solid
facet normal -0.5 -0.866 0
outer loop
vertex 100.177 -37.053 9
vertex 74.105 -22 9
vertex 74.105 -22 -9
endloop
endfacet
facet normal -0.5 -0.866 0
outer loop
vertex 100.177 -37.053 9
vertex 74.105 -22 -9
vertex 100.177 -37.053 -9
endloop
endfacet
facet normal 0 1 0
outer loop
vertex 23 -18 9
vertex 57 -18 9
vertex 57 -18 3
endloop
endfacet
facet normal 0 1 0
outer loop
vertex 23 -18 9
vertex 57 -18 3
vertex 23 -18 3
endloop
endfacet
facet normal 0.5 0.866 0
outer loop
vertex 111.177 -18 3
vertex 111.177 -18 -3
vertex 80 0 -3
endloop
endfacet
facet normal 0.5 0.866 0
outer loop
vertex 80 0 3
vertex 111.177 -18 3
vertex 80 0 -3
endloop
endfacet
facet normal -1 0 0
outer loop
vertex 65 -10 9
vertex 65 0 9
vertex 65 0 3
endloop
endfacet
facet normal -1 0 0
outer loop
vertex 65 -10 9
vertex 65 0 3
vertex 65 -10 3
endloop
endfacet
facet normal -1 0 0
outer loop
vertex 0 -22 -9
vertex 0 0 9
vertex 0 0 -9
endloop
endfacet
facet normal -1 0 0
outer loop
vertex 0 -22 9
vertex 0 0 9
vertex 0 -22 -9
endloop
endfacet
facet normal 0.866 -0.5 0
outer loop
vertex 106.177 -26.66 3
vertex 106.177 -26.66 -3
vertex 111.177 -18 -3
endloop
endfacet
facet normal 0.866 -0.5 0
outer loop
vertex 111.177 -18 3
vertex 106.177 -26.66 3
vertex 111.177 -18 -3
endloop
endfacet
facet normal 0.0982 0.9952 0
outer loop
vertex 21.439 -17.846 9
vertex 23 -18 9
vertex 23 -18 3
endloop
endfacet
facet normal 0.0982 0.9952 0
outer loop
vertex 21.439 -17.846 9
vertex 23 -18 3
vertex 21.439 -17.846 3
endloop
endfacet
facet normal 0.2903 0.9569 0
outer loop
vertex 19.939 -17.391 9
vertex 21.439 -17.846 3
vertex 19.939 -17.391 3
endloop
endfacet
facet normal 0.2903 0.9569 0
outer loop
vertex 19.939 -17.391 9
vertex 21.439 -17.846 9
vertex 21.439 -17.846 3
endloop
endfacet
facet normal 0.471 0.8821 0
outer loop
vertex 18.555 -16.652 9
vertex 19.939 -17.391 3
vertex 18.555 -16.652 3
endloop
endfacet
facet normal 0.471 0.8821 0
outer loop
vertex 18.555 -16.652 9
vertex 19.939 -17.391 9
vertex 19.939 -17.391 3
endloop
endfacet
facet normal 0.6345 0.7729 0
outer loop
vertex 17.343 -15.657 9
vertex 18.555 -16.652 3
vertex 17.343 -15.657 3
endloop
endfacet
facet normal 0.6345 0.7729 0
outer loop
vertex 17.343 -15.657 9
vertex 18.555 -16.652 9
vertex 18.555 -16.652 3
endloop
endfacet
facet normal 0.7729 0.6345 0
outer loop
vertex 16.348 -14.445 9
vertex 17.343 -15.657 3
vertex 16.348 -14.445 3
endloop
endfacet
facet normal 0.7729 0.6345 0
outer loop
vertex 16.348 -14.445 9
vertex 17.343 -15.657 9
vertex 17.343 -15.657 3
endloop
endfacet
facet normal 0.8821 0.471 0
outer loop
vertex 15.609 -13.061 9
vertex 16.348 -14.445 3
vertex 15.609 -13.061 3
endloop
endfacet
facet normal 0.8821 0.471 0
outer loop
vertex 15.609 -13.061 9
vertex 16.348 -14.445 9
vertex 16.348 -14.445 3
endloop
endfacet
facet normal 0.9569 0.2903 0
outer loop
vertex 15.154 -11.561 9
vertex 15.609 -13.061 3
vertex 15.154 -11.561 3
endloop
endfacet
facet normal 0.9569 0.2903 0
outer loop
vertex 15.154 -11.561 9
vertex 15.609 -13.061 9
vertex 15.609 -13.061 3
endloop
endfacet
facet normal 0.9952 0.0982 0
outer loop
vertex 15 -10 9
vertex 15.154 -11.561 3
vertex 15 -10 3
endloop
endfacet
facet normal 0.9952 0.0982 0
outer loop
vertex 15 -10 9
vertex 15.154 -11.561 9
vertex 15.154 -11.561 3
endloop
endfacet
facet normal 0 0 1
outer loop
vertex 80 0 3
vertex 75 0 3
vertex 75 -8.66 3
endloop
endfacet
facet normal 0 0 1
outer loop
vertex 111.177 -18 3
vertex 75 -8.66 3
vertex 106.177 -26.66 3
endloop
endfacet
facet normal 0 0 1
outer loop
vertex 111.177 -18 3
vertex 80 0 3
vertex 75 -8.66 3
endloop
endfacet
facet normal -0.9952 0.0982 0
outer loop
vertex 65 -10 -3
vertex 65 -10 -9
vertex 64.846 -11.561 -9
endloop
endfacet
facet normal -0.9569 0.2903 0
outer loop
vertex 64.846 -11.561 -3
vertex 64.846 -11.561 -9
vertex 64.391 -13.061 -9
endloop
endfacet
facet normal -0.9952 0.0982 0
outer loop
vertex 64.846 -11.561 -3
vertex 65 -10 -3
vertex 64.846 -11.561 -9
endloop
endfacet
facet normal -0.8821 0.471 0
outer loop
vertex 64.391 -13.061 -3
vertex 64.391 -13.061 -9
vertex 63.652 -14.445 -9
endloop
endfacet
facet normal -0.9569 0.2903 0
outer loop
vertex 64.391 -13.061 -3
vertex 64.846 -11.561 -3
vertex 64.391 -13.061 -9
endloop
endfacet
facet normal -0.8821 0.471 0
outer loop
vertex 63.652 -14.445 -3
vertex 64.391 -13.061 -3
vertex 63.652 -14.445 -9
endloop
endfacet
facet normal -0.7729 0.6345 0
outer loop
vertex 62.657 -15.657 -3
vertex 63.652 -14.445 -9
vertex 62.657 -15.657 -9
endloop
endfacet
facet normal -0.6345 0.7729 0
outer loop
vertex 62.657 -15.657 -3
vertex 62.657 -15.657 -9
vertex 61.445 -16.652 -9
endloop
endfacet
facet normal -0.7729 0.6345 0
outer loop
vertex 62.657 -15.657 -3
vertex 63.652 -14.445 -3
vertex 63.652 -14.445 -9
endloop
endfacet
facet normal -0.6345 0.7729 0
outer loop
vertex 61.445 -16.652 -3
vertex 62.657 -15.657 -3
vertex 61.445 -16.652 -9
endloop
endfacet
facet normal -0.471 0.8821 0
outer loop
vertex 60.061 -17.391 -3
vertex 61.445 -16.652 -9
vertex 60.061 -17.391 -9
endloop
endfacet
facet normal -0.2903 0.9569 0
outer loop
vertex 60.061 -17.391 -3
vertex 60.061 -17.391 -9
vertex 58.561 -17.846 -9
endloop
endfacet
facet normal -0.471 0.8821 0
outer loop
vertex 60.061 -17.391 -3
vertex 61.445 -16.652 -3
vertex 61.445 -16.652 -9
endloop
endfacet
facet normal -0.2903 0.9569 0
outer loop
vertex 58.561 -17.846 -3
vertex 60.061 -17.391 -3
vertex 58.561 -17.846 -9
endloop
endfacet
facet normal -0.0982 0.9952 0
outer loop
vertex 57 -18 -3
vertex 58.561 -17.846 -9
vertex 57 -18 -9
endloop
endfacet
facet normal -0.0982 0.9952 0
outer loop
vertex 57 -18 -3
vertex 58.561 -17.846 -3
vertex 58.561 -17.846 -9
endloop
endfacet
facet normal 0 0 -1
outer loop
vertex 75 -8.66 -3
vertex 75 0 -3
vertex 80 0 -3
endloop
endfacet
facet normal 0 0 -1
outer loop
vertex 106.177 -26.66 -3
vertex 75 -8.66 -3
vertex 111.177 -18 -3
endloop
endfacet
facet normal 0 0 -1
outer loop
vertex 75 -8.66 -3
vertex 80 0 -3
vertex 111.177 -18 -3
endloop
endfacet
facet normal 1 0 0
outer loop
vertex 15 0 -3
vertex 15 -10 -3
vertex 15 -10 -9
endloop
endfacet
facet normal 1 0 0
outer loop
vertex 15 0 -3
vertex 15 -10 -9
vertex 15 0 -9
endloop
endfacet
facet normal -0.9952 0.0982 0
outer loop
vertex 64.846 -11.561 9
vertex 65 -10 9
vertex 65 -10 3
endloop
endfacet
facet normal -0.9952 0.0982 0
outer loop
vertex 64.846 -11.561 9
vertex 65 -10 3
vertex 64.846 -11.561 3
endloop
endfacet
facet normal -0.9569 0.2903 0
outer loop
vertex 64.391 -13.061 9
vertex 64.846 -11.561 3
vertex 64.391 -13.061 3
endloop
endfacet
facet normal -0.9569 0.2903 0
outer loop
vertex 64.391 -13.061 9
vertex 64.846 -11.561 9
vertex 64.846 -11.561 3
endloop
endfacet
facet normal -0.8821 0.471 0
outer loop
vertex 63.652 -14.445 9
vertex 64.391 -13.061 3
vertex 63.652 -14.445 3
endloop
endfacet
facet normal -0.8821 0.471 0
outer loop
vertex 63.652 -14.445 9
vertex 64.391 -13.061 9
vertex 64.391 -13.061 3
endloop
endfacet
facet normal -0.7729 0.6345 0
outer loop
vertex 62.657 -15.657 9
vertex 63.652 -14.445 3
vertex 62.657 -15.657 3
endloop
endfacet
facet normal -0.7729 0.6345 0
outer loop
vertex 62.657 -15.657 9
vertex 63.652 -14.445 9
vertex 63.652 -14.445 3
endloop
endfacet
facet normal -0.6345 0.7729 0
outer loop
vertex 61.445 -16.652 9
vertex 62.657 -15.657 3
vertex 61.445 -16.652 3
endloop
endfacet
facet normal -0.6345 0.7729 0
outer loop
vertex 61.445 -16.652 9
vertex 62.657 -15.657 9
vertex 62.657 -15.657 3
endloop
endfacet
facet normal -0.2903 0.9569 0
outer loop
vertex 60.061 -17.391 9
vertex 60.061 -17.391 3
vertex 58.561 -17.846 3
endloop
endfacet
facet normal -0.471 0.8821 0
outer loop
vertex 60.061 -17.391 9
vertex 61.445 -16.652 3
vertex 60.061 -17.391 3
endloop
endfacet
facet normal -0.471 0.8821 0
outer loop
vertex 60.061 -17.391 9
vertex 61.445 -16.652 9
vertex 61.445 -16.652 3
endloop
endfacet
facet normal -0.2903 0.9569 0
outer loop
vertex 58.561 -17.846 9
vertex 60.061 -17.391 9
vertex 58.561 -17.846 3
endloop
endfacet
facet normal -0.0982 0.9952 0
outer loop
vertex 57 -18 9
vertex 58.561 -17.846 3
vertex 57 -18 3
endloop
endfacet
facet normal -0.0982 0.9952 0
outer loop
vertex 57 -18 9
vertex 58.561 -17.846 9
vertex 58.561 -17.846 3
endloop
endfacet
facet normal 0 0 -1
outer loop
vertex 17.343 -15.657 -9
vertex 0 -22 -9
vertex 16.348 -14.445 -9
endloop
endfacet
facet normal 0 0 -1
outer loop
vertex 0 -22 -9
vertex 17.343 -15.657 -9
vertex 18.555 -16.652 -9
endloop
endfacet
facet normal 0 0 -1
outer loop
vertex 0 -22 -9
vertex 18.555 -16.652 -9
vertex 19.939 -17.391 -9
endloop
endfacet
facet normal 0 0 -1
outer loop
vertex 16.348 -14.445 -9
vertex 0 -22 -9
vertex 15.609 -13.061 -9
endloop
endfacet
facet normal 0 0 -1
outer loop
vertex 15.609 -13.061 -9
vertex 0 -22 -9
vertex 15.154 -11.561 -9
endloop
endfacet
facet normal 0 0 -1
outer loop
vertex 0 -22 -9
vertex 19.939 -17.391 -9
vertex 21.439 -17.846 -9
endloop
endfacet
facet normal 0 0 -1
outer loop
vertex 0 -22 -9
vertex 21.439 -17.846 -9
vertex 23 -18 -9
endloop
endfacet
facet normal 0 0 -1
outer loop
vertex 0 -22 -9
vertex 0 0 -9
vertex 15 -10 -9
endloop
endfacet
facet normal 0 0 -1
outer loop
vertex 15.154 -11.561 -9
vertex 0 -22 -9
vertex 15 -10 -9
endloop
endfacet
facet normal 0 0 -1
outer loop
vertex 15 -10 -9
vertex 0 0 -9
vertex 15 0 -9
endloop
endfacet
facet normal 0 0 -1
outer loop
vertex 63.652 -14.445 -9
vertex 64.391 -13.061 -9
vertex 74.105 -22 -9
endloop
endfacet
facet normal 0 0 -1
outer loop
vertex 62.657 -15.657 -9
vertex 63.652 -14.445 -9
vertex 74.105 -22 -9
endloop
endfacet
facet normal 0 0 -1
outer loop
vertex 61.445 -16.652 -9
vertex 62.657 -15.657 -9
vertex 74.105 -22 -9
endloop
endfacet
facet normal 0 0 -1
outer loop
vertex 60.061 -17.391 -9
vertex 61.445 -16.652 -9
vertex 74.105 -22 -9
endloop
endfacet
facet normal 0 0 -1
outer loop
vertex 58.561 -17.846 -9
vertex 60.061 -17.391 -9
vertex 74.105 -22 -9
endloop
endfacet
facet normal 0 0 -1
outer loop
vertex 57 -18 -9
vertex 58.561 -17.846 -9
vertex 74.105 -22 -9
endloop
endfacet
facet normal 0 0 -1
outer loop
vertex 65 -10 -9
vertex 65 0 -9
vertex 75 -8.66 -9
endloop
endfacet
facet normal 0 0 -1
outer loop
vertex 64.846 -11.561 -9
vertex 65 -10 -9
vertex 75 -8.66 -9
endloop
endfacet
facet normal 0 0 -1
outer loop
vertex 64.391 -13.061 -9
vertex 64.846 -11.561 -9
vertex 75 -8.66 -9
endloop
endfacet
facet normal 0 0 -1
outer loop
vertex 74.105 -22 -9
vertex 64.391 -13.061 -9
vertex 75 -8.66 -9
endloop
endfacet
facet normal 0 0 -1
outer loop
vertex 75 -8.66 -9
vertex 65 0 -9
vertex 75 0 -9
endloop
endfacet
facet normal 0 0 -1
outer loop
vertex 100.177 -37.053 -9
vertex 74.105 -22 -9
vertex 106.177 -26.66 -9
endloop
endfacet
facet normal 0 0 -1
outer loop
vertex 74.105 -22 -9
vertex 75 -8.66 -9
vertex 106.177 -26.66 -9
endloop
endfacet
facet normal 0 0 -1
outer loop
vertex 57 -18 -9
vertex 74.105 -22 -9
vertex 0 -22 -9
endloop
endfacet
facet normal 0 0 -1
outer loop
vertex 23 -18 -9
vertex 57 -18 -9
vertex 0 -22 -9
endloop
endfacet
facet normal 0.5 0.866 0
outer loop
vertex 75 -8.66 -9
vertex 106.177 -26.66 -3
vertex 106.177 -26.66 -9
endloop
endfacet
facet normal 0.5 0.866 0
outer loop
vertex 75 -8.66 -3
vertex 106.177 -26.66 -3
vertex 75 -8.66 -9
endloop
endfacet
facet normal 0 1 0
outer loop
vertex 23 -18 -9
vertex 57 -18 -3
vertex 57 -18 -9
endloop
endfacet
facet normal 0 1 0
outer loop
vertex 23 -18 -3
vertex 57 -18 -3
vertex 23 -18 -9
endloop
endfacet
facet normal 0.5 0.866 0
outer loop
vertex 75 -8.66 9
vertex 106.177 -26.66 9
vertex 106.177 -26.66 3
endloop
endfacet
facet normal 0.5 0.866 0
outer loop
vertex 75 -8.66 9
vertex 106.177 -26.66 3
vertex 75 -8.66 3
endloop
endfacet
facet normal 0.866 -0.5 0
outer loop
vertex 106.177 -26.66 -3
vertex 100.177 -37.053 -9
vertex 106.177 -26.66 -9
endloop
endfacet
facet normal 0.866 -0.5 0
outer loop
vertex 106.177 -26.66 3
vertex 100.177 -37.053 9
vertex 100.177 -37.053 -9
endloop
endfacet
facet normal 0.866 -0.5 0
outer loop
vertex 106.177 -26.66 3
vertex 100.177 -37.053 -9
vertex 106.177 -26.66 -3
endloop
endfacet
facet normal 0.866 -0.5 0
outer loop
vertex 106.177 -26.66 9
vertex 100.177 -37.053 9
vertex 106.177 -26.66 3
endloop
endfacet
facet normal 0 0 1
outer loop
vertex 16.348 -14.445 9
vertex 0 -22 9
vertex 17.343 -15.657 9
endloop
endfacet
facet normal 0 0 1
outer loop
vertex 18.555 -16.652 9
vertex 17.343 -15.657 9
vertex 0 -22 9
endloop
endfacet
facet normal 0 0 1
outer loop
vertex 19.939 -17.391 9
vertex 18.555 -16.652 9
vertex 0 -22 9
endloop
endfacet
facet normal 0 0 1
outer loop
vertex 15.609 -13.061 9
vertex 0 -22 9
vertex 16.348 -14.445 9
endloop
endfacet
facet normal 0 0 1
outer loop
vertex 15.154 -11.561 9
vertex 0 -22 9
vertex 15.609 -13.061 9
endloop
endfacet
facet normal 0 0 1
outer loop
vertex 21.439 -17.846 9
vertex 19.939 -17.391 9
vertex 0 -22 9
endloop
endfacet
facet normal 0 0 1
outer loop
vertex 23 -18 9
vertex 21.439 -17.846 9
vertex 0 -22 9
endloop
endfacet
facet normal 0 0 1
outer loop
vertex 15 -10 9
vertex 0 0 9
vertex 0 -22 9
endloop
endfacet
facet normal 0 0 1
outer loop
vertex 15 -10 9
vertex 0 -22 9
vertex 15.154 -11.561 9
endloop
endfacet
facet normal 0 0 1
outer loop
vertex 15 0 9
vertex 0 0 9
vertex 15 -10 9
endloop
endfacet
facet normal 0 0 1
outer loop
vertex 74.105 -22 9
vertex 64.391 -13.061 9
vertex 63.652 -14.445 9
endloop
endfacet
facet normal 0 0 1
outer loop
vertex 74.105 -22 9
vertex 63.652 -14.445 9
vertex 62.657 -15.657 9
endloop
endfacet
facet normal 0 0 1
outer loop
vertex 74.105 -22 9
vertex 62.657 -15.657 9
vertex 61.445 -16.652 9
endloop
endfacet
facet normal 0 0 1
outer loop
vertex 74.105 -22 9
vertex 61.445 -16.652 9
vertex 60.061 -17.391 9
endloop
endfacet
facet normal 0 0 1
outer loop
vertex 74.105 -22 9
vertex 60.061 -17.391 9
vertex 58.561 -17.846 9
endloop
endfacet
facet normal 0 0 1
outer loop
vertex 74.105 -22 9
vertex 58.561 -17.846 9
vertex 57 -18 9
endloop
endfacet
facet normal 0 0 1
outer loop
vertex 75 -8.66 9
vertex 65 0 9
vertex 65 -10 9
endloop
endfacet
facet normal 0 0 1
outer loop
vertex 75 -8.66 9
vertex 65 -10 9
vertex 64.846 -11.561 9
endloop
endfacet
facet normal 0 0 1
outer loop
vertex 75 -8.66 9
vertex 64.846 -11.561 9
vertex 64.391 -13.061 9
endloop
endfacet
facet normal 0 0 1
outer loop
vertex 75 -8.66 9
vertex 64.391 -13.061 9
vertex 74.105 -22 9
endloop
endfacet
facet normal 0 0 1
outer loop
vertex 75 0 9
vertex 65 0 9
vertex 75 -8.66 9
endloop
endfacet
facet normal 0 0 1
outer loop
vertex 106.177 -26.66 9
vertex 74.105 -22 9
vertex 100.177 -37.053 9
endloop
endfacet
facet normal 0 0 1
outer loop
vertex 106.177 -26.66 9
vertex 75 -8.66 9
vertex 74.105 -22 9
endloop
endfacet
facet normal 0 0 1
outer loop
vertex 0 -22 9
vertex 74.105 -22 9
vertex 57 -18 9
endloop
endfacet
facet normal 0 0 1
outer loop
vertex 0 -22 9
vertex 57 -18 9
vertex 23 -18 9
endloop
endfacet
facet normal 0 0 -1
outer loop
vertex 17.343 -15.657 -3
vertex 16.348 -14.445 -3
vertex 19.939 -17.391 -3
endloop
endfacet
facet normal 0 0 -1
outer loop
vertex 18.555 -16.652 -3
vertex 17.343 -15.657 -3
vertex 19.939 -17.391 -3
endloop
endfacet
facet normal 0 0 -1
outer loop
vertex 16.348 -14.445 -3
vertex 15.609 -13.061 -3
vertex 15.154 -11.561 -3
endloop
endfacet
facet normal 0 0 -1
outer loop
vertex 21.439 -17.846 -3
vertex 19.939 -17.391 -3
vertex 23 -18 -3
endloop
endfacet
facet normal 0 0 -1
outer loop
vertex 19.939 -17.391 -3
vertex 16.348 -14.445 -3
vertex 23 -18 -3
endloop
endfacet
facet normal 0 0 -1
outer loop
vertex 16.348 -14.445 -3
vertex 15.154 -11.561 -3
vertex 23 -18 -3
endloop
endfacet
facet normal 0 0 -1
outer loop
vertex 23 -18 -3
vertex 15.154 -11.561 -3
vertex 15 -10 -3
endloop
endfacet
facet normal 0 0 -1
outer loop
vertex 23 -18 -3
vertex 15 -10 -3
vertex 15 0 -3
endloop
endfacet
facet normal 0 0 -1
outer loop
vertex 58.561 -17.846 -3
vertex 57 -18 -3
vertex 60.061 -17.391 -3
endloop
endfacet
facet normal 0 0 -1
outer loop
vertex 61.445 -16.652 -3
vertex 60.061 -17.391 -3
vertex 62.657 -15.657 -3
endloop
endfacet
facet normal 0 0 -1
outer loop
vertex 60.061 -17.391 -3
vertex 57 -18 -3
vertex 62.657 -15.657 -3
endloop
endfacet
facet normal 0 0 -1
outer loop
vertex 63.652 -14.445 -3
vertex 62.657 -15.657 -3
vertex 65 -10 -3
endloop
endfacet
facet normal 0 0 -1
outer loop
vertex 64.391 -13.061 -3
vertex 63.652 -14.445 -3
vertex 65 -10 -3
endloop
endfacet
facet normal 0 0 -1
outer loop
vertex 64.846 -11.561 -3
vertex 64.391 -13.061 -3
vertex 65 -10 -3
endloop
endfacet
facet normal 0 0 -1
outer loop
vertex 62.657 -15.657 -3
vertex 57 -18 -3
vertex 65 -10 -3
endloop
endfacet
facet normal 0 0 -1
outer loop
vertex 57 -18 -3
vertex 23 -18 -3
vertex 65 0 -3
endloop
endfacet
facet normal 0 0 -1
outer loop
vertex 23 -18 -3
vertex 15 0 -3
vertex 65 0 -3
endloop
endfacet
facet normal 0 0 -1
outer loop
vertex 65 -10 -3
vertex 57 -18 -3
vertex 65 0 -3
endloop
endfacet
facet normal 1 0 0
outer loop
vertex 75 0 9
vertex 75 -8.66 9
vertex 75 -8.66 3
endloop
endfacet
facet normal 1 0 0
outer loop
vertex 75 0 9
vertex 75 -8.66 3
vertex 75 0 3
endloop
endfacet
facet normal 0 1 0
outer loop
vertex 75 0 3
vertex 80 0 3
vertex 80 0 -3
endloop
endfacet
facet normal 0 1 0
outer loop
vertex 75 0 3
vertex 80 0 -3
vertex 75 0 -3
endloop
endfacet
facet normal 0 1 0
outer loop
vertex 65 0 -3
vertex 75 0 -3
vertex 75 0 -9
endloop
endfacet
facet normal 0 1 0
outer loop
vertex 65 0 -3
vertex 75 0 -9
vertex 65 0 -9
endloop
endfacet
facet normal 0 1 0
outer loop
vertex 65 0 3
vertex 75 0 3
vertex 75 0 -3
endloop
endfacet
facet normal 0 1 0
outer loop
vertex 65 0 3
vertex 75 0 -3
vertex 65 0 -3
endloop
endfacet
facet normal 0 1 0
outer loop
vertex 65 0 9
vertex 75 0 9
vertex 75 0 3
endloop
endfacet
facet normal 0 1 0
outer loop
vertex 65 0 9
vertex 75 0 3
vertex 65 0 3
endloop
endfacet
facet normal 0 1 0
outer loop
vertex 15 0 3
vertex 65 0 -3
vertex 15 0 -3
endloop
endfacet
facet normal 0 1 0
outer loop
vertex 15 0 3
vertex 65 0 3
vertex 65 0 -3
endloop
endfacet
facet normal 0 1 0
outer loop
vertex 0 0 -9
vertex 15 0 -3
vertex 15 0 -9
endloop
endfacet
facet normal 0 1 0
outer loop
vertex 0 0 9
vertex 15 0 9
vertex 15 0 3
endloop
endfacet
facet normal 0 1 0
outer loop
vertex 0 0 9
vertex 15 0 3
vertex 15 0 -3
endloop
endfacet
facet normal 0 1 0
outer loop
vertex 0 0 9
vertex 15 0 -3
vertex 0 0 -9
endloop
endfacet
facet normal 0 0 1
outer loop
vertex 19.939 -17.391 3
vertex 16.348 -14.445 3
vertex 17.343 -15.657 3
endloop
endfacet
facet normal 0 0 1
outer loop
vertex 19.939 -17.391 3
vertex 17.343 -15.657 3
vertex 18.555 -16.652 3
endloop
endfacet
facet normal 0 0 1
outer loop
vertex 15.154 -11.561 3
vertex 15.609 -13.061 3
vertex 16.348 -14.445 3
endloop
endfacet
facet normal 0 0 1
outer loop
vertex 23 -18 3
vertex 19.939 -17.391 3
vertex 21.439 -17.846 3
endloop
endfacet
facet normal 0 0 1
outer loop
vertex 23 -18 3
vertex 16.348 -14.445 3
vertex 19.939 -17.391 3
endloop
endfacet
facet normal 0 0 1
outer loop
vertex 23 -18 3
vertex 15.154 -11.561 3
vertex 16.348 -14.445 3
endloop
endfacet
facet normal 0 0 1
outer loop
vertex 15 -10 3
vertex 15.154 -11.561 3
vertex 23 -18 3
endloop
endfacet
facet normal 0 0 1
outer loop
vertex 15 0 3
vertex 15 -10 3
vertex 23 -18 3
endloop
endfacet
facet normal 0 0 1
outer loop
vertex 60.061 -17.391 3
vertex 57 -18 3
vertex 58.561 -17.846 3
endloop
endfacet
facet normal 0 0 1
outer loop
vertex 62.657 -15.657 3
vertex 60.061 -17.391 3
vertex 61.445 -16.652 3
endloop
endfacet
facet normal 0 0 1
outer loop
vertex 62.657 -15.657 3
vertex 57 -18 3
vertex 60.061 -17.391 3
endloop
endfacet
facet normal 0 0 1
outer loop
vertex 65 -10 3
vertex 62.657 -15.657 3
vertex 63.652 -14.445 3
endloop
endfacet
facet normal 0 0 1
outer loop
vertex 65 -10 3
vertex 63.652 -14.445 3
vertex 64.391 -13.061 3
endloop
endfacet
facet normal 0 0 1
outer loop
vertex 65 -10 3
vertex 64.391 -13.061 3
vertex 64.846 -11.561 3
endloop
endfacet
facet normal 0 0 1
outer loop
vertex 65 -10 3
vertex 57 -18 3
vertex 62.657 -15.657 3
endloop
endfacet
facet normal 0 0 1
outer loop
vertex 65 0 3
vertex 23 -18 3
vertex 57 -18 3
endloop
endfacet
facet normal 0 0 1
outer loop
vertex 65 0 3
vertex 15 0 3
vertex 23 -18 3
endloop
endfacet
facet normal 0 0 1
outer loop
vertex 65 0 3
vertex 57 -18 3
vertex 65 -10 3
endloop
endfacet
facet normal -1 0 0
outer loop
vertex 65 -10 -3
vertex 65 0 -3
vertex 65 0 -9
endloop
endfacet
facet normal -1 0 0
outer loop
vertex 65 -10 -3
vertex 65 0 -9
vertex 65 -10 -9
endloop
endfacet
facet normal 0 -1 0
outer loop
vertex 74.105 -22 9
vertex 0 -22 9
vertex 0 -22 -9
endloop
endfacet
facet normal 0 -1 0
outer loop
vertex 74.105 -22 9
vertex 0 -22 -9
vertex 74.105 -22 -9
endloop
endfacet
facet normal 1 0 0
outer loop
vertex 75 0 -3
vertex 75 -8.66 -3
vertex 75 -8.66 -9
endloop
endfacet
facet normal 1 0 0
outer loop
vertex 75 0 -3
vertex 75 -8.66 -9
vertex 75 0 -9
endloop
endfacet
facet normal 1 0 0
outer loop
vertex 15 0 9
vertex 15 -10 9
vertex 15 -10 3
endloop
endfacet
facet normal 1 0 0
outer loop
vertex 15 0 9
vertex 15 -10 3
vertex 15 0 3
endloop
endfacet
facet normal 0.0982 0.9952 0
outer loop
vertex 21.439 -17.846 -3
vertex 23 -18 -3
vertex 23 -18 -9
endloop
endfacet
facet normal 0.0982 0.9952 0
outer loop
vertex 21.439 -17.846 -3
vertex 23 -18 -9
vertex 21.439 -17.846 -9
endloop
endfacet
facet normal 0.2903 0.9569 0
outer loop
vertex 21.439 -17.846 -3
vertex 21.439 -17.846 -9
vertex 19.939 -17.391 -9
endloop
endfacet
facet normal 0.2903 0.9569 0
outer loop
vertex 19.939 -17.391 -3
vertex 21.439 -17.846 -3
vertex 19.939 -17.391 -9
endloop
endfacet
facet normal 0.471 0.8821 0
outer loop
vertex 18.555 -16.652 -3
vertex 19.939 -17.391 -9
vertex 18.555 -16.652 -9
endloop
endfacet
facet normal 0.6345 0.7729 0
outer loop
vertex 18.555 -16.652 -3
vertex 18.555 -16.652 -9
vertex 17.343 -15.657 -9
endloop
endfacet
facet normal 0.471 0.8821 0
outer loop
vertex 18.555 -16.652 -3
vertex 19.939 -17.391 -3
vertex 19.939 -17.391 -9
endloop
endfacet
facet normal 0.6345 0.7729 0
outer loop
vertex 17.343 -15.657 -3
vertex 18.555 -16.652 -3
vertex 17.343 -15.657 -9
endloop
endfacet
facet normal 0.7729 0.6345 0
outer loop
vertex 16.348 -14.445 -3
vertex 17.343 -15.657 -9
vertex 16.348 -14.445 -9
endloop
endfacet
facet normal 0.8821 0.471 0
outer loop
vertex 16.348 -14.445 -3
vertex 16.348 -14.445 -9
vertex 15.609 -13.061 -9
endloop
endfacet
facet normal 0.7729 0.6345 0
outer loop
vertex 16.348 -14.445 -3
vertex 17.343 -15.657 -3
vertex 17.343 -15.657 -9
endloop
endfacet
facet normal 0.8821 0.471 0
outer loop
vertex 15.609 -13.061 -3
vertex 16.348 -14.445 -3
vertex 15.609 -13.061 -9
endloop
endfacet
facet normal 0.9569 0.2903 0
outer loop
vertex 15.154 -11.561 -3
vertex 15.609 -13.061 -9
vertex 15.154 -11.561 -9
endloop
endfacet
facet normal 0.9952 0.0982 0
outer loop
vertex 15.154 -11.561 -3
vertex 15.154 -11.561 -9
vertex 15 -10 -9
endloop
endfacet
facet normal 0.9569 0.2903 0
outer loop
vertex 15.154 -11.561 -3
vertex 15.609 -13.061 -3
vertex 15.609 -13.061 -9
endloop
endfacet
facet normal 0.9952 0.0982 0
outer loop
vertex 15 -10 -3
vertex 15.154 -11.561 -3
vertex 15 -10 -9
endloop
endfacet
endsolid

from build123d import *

# Parameters (mm, degrees)
EXTRUDE_1_DEPTH = 9
EXTRUDE_2_DEPTH = 3


with BuildPart() as part:
    # 스케치1 → 보스-돌출1 (new, symmetric)
    with BuildSketch(Plane.XY):
        with BuildLine():
            Line((75, -8.660254038), (75, 0))
            Line((75, 0), (65, 0))
            Line((65, 0), (65, -10))
            ThreePointArc((65, -10), (62.656854249, -15.656854249), (57, -18))
            Line((57, -18), (23, -18))
            ThreePointArc((23, -18), (17.343145751, -15.656854249), (15, -10))
            Line((15, -10), (15, 0))
            Line((15, 0), (0, 0))
            Line((0, 0), (0, -22))
            Line((0, -22), (74.105117767, -22))
            Line((74.105117767, -22), (100.176914536, -37.052558883))
            Line((100.176914536, -37.052558883), (106.176914536, -26.660254038))
            Line((106.176914536, -26.660254038), (75, -8.660254038))
        make_face()
    extrude(amount=EXTRUDE_1_DEPTH, both=True)

    # 스케치1<3> → 보스-돌출2 (add, symmetric)
    with BuildSketch(Plane.XY):
        Polygon((80, 0), (75, 0), (75, -8.660254038), (106.176914536, -26.660254038), (111.176914536, -18), align=None)
        with BuildLine():
            Line((65, -10), (65, 0))
            Line((65, 0), (15, 0))
            Line((15, 0), (15, -10))
            ThreePointArc((15, -10), (17.343145751, -15.656854249), (23, -18))
            Line((23, -18), (57, -18))
            ThreePointArc((57, -18), (62.656854249, -15.656854249), (65, -10))
        make_face()
    extrude(amount=EXTRUDE_2_DEPTH, both=True)


solid = part.part
